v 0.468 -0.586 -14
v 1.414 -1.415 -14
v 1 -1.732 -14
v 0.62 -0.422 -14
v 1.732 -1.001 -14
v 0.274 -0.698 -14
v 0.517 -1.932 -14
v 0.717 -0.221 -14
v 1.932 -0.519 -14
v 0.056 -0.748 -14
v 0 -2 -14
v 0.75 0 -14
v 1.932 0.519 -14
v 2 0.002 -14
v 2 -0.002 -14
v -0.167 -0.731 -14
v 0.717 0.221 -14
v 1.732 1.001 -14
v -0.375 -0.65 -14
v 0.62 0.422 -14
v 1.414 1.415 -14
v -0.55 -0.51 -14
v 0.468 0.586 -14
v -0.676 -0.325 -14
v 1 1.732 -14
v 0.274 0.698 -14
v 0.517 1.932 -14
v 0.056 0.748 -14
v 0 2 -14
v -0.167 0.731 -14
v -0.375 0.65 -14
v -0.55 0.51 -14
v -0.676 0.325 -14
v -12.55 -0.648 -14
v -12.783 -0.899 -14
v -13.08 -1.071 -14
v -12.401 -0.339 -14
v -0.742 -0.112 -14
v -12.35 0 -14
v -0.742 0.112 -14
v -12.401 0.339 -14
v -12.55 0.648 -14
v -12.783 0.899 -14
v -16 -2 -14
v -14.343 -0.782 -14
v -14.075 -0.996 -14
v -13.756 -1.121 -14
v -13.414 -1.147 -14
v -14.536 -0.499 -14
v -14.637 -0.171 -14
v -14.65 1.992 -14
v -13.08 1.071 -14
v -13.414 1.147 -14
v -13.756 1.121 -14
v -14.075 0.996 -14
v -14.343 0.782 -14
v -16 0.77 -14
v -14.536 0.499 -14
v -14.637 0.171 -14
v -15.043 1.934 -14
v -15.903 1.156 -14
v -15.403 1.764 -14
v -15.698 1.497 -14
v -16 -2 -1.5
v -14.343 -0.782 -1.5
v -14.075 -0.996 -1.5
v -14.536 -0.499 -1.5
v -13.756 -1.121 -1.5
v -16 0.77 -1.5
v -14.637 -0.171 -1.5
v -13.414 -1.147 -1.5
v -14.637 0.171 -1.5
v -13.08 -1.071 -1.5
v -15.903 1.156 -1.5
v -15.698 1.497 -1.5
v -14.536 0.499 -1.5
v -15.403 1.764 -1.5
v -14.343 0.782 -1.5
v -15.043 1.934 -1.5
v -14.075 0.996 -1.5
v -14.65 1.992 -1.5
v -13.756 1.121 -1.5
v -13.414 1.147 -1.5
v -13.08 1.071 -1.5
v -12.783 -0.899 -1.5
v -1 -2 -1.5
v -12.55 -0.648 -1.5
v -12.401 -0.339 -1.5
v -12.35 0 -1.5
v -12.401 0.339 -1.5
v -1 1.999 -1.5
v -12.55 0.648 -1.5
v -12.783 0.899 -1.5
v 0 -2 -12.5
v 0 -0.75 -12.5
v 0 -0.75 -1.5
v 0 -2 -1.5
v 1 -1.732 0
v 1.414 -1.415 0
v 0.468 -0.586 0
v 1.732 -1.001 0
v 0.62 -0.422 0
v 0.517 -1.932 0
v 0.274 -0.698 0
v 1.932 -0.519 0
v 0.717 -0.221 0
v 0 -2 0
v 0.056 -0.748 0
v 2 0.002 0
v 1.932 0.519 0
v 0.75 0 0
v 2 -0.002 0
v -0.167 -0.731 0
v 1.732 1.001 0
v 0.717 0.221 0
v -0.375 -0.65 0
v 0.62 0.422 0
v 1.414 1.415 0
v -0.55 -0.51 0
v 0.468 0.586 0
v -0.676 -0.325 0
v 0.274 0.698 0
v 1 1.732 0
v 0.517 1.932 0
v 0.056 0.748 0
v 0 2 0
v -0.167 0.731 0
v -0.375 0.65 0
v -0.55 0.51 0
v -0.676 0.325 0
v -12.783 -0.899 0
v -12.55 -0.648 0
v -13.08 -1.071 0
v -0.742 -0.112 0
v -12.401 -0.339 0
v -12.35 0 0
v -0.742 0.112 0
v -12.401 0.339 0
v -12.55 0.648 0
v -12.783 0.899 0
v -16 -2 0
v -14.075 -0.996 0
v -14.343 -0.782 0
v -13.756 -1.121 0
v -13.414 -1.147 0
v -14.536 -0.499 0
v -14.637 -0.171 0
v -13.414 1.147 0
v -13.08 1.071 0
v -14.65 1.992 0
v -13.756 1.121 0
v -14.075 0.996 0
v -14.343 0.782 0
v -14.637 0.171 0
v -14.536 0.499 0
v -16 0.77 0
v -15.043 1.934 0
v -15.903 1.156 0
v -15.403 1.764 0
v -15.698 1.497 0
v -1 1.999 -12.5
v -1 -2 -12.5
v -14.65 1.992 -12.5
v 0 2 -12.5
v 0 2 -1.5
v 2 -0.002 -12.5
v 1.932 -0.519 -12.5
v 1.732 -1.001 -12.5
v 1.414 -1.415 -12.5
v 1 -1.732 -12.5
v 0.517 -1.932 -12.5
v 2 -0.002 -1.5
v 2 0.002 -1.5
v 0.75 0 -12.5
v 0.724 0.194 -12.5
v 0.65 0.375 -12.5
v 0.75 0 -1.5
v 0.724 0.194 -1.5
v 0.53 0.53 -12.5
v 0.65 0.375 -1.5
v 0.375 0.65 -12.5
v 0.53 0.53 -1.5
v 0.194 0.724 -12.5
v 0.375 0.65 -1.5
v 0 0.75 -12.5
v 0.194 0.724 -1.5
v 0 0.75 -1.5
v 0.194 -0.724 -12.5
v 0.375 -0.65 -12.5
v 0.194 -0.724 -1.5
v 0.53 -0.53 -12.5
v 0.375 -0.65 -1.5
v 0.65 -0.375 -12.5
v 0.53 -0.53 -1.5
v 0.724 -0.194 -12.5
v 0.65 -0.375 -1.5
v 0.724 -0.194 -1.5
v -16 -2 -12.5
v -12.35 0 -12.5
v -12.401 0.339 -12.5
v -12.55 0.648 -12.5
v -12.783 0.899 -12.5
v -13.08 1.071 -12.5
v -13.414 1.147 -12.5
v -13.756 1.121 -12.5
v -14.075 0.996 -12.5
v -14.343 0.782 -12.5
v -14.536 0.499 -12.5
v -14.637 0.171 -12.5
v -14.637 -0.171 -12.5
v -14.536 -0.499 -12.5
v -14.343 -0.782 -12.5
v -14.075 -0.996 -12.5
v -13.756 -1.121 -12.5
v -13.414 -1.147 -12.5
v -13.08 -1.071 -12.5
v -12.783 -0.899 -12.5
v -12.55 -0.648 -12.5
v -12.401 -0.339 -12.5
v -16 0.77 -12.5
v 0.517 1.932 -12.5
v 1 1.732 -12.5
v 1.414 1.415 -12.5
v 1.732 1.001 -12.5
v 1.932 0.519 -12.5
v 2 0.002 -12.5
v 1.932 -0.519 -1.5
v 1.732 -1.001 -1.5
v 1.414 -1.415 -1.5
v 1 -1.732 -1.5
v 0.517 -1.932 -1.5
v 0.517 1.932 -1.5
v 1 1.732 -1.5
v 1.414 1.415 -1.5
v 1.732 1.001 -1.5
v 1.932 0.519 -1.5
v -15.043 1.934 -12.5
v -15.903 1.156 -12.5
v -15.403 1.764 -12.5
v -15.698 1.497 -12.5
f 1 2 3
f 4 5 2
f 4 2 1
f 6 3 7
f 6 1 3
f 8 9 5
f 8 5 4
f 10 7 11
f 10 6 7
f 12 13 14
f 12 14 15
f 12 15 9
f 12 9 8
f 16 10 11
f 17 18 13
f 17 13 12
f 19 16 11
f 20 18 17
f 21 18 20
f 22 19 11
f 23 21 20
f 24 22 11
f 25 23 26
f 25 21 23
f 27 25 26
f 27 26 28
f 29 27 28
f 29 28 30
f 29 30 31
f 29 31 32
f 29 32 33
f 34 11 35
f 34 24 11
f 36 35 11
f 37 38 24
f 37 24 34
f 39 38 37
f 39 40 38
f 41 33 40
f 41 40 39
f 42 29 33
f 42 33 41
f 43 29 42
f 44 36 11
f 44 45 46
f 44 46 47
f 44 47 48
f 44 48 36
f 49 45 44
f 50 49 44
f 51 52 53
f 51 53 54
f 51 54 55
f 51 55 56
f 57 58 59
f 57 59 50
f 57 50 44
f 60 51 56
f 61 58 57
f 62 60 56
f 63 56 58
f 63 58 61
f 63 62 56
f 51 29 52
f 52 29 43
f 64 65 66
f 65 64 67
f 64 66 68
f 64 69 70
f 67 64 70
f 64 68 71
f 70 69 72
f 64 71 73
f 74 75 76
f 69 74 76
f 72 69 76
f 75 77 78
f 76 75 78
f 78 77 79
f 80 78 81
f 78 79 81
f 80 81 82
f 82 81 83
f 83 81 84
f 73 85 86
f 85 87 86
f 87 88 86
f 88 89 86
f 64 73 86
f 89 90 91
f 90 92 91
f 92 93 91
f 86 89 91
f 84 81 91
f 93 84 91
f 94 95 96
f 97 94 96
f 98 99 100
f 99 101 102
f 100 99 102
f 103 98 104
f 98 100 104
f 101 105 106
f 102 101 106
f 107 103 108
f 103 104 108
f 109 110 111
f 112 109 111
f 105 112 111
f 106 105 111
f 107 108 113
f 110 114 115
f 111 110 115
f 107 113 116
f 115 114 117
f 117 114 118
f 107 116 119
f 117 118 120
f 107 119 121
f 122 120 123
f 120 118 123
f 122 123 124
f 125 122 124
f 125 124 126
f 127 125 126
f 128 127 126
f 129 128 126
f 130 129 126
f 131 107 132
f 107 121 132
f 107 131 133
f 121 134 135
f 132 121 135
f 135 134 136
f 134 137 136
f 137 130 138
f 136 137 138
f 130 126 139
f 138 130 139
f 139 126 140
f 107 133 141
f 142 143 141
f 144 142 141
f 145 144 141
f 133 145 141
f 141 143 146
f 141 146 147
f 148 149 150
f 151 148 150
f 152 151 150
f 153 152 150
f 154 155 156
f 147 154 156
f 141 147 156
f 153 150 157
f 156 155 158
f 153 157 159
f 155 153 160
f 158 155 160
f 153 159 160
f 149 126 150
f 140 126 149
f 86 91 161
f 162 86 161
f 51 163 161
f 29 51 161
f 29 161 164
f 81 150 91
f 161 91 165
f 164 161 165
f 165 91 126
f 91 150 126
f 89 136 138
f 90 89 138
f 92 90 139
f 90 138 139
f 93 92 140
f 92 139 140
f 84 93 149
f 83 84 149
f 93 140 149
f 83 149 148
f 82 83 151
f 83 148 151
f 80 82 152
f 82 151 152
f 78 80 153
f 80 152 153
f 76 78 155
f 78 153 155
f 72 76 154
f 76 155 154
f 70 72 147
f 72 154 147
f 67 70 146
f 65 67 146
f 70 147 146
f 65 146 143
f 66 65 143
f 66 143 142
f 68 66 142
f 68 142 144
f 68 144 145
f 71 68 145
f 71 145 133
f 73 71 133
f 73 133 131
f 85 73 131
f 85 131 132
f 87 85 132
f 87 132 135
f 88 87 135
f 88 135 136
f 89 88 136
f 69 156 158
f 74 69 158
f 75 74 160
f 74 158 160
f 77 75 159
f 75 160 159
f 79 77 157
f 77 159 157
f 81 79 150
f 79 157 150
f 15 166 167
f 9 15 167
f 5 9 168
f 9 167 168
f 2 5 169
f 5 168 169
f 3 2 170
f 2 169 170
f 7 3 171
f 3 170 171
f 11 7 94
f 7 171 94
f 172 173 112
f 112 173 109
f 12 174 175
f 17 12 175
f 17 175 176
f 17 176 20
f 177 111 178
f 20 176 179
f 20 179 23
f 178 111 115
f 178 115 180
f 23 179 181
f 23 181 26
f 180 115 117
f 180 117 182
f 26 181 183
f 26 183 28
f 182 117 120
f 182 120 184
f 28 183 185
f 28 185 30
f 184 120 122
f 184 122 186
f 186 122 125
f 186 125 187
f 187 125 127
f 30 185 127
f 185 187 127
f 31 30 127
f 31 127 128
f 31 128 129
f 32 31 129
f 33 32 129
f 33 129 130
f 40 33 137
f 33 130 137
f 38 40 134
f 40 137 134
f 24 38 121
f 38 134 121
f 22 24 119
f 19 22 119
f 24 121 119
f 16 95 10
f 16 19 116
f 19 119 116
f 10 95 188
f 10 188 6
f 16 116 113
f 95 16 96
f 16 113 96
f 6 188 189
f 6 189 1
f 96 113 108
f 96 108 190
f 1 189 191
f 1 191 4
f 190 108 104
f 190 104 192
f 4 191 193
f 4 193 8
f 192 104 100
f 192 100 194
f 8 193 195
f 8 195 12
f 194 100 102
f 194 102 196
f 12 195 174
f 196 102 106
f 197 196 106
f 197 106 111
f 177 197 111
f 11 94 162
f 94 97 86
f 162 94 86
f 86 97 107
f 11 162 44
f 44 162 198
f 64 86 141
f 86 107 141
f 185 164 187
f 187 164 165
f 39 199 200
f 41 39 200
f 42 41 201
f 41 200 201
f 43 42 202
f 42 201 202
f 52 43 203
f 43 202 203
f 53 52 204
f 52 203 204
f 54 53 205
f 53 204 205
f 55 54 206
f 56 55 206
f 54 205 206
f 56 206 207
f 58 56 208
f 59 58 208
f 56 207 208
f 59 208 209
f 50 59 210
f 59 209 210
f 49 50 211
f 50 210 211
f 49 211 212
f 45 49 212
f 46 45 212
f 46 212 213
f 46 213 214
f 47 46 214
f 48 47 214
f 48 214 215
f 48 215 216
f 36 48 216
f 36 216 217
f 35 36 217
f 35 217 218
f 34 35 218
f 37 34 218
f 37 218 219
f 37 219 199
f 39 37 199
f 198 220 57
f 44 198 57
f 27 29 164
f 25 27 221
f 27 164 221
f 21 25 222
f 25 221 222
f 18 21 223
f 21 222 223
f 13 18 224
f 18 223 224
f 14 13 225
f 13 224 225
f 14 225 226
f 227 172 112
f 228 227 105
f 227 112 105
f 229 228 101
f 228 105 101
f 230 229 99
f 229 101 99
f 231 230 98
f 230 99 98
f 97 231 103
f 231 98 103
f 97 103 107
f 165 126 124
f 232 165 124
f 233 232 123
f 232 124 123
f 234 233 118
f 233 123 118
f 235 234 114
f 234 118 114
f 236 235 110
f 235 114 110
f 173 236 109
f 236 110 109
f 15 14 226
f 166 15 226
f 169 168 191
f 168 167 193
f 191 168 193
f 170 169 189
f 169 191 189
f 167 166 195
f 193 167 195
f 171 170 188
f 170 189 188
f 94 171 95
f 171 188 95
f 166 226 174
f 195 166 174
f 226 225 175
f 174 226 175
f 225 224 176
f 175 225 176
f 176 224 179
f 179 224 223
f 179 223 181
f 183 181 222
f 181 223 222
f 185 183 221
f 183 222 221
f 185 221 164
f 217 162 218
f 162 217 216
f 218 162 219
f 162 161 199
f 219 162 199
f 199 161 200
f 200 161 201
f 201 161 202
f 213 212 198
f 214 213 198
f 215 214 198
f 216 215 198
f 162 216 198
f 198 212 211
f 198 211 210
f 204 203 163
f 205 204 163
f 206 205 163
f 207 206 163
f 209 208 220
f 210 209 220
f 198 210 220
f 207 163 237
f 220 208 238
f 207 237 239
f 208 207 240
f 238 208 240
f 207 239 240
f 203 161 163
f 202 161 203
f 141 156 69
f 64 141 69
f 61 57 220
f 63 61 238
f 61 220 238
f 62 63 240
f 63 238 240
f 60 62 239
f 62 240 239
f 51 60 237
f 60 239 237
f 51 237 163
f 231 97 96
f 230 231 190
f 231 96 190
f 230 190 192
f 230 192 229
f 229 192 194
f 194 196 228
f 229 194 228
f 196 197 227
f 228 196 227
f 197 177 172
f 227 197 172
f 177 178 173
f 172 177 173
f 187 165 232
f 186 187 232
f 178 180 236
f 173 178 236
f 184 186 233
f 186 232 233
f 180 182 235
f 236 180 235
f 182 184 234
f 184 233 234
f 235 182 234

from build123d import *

# Parameters (mm, degrees)
SKETCH5_R          = 1.15
SKETCH5_R_2        = 0.749999784
BASE_EXTRUDE_DEPTH = 14.000000432
SKETCH9_OUTSIDE_W  = 24.639
SKETCH9_OUTSIDE_H  = 20.632
CUT_EXTRUDE2_DEPTH = 37.000000432


with BuildPart() as part:
    # Sketch5 → Base-Extrude (new body)
    with BuildSketch(Plane.XY):
        with BuildLine():
            Line((-14.650000216, 1.992481203), (-2.16e-07, 2.000000047))
            ThreePointArc((-2.16e-07, 2.000000047), (2.000000047, 1.08e-07), (0, -2.000000047))
            Line((0, -2.000000047), (-15.999999829, -2.000000047))
            Line((-15.999999829, -2.000000047), (-15.999999829, 0.500000071))
            ThreePointArc((-15.999999829, 0.500000071), (-15.656001468, 1.545642629), (-14.650000216, 1.992481203))
        make_face()
        with Locations((-13.500000216, 4.7e-08)):
            Circle(SKETCH5_R, mode=Mode.SUBTRACT)
        Circle(SKETCH5_R_2, mode=Mode.SUBTRACT)
    extrude(amount=-BASE_EXTRUDE_DEPTH)

    # Sketch9 outside → Cut-Extrude2 (cut)
    with BuildSketch(Plane(origin=(0, 17.539650086, 0), x_dir=(-1, 0, 0), z_dir=(0, 1, 0))):
        with Locations((7.0035, -7)):
            Rectangle(SKETCH9_OUTSIDE_W, SKETCH9_OUTSIDE_H)
        Polygon((5.500000203, -12.500000186), (15.999999829, -12.500000186), (15.999999829, -14.000000432), (-1.999999397, -14.000000432), (-1.999999397, -12.500000186), (0, -12.500000186), (0, -1.500000246), (-1.999999397, -1.500000246), (-1.999999397, 0), (15.999999829, 0), (15.999999829, -1.500000246), (5.500000203, -1.500000246), (1.000000164, -1.500000246), (1.000000164, -12.500000186), align=None, mode=Mode.SUBTRACT)
    extrude(amount=-CUT_EXTRUDE2_DEPTH, mode=Mode.SUBTRACT)


solid = part.part
